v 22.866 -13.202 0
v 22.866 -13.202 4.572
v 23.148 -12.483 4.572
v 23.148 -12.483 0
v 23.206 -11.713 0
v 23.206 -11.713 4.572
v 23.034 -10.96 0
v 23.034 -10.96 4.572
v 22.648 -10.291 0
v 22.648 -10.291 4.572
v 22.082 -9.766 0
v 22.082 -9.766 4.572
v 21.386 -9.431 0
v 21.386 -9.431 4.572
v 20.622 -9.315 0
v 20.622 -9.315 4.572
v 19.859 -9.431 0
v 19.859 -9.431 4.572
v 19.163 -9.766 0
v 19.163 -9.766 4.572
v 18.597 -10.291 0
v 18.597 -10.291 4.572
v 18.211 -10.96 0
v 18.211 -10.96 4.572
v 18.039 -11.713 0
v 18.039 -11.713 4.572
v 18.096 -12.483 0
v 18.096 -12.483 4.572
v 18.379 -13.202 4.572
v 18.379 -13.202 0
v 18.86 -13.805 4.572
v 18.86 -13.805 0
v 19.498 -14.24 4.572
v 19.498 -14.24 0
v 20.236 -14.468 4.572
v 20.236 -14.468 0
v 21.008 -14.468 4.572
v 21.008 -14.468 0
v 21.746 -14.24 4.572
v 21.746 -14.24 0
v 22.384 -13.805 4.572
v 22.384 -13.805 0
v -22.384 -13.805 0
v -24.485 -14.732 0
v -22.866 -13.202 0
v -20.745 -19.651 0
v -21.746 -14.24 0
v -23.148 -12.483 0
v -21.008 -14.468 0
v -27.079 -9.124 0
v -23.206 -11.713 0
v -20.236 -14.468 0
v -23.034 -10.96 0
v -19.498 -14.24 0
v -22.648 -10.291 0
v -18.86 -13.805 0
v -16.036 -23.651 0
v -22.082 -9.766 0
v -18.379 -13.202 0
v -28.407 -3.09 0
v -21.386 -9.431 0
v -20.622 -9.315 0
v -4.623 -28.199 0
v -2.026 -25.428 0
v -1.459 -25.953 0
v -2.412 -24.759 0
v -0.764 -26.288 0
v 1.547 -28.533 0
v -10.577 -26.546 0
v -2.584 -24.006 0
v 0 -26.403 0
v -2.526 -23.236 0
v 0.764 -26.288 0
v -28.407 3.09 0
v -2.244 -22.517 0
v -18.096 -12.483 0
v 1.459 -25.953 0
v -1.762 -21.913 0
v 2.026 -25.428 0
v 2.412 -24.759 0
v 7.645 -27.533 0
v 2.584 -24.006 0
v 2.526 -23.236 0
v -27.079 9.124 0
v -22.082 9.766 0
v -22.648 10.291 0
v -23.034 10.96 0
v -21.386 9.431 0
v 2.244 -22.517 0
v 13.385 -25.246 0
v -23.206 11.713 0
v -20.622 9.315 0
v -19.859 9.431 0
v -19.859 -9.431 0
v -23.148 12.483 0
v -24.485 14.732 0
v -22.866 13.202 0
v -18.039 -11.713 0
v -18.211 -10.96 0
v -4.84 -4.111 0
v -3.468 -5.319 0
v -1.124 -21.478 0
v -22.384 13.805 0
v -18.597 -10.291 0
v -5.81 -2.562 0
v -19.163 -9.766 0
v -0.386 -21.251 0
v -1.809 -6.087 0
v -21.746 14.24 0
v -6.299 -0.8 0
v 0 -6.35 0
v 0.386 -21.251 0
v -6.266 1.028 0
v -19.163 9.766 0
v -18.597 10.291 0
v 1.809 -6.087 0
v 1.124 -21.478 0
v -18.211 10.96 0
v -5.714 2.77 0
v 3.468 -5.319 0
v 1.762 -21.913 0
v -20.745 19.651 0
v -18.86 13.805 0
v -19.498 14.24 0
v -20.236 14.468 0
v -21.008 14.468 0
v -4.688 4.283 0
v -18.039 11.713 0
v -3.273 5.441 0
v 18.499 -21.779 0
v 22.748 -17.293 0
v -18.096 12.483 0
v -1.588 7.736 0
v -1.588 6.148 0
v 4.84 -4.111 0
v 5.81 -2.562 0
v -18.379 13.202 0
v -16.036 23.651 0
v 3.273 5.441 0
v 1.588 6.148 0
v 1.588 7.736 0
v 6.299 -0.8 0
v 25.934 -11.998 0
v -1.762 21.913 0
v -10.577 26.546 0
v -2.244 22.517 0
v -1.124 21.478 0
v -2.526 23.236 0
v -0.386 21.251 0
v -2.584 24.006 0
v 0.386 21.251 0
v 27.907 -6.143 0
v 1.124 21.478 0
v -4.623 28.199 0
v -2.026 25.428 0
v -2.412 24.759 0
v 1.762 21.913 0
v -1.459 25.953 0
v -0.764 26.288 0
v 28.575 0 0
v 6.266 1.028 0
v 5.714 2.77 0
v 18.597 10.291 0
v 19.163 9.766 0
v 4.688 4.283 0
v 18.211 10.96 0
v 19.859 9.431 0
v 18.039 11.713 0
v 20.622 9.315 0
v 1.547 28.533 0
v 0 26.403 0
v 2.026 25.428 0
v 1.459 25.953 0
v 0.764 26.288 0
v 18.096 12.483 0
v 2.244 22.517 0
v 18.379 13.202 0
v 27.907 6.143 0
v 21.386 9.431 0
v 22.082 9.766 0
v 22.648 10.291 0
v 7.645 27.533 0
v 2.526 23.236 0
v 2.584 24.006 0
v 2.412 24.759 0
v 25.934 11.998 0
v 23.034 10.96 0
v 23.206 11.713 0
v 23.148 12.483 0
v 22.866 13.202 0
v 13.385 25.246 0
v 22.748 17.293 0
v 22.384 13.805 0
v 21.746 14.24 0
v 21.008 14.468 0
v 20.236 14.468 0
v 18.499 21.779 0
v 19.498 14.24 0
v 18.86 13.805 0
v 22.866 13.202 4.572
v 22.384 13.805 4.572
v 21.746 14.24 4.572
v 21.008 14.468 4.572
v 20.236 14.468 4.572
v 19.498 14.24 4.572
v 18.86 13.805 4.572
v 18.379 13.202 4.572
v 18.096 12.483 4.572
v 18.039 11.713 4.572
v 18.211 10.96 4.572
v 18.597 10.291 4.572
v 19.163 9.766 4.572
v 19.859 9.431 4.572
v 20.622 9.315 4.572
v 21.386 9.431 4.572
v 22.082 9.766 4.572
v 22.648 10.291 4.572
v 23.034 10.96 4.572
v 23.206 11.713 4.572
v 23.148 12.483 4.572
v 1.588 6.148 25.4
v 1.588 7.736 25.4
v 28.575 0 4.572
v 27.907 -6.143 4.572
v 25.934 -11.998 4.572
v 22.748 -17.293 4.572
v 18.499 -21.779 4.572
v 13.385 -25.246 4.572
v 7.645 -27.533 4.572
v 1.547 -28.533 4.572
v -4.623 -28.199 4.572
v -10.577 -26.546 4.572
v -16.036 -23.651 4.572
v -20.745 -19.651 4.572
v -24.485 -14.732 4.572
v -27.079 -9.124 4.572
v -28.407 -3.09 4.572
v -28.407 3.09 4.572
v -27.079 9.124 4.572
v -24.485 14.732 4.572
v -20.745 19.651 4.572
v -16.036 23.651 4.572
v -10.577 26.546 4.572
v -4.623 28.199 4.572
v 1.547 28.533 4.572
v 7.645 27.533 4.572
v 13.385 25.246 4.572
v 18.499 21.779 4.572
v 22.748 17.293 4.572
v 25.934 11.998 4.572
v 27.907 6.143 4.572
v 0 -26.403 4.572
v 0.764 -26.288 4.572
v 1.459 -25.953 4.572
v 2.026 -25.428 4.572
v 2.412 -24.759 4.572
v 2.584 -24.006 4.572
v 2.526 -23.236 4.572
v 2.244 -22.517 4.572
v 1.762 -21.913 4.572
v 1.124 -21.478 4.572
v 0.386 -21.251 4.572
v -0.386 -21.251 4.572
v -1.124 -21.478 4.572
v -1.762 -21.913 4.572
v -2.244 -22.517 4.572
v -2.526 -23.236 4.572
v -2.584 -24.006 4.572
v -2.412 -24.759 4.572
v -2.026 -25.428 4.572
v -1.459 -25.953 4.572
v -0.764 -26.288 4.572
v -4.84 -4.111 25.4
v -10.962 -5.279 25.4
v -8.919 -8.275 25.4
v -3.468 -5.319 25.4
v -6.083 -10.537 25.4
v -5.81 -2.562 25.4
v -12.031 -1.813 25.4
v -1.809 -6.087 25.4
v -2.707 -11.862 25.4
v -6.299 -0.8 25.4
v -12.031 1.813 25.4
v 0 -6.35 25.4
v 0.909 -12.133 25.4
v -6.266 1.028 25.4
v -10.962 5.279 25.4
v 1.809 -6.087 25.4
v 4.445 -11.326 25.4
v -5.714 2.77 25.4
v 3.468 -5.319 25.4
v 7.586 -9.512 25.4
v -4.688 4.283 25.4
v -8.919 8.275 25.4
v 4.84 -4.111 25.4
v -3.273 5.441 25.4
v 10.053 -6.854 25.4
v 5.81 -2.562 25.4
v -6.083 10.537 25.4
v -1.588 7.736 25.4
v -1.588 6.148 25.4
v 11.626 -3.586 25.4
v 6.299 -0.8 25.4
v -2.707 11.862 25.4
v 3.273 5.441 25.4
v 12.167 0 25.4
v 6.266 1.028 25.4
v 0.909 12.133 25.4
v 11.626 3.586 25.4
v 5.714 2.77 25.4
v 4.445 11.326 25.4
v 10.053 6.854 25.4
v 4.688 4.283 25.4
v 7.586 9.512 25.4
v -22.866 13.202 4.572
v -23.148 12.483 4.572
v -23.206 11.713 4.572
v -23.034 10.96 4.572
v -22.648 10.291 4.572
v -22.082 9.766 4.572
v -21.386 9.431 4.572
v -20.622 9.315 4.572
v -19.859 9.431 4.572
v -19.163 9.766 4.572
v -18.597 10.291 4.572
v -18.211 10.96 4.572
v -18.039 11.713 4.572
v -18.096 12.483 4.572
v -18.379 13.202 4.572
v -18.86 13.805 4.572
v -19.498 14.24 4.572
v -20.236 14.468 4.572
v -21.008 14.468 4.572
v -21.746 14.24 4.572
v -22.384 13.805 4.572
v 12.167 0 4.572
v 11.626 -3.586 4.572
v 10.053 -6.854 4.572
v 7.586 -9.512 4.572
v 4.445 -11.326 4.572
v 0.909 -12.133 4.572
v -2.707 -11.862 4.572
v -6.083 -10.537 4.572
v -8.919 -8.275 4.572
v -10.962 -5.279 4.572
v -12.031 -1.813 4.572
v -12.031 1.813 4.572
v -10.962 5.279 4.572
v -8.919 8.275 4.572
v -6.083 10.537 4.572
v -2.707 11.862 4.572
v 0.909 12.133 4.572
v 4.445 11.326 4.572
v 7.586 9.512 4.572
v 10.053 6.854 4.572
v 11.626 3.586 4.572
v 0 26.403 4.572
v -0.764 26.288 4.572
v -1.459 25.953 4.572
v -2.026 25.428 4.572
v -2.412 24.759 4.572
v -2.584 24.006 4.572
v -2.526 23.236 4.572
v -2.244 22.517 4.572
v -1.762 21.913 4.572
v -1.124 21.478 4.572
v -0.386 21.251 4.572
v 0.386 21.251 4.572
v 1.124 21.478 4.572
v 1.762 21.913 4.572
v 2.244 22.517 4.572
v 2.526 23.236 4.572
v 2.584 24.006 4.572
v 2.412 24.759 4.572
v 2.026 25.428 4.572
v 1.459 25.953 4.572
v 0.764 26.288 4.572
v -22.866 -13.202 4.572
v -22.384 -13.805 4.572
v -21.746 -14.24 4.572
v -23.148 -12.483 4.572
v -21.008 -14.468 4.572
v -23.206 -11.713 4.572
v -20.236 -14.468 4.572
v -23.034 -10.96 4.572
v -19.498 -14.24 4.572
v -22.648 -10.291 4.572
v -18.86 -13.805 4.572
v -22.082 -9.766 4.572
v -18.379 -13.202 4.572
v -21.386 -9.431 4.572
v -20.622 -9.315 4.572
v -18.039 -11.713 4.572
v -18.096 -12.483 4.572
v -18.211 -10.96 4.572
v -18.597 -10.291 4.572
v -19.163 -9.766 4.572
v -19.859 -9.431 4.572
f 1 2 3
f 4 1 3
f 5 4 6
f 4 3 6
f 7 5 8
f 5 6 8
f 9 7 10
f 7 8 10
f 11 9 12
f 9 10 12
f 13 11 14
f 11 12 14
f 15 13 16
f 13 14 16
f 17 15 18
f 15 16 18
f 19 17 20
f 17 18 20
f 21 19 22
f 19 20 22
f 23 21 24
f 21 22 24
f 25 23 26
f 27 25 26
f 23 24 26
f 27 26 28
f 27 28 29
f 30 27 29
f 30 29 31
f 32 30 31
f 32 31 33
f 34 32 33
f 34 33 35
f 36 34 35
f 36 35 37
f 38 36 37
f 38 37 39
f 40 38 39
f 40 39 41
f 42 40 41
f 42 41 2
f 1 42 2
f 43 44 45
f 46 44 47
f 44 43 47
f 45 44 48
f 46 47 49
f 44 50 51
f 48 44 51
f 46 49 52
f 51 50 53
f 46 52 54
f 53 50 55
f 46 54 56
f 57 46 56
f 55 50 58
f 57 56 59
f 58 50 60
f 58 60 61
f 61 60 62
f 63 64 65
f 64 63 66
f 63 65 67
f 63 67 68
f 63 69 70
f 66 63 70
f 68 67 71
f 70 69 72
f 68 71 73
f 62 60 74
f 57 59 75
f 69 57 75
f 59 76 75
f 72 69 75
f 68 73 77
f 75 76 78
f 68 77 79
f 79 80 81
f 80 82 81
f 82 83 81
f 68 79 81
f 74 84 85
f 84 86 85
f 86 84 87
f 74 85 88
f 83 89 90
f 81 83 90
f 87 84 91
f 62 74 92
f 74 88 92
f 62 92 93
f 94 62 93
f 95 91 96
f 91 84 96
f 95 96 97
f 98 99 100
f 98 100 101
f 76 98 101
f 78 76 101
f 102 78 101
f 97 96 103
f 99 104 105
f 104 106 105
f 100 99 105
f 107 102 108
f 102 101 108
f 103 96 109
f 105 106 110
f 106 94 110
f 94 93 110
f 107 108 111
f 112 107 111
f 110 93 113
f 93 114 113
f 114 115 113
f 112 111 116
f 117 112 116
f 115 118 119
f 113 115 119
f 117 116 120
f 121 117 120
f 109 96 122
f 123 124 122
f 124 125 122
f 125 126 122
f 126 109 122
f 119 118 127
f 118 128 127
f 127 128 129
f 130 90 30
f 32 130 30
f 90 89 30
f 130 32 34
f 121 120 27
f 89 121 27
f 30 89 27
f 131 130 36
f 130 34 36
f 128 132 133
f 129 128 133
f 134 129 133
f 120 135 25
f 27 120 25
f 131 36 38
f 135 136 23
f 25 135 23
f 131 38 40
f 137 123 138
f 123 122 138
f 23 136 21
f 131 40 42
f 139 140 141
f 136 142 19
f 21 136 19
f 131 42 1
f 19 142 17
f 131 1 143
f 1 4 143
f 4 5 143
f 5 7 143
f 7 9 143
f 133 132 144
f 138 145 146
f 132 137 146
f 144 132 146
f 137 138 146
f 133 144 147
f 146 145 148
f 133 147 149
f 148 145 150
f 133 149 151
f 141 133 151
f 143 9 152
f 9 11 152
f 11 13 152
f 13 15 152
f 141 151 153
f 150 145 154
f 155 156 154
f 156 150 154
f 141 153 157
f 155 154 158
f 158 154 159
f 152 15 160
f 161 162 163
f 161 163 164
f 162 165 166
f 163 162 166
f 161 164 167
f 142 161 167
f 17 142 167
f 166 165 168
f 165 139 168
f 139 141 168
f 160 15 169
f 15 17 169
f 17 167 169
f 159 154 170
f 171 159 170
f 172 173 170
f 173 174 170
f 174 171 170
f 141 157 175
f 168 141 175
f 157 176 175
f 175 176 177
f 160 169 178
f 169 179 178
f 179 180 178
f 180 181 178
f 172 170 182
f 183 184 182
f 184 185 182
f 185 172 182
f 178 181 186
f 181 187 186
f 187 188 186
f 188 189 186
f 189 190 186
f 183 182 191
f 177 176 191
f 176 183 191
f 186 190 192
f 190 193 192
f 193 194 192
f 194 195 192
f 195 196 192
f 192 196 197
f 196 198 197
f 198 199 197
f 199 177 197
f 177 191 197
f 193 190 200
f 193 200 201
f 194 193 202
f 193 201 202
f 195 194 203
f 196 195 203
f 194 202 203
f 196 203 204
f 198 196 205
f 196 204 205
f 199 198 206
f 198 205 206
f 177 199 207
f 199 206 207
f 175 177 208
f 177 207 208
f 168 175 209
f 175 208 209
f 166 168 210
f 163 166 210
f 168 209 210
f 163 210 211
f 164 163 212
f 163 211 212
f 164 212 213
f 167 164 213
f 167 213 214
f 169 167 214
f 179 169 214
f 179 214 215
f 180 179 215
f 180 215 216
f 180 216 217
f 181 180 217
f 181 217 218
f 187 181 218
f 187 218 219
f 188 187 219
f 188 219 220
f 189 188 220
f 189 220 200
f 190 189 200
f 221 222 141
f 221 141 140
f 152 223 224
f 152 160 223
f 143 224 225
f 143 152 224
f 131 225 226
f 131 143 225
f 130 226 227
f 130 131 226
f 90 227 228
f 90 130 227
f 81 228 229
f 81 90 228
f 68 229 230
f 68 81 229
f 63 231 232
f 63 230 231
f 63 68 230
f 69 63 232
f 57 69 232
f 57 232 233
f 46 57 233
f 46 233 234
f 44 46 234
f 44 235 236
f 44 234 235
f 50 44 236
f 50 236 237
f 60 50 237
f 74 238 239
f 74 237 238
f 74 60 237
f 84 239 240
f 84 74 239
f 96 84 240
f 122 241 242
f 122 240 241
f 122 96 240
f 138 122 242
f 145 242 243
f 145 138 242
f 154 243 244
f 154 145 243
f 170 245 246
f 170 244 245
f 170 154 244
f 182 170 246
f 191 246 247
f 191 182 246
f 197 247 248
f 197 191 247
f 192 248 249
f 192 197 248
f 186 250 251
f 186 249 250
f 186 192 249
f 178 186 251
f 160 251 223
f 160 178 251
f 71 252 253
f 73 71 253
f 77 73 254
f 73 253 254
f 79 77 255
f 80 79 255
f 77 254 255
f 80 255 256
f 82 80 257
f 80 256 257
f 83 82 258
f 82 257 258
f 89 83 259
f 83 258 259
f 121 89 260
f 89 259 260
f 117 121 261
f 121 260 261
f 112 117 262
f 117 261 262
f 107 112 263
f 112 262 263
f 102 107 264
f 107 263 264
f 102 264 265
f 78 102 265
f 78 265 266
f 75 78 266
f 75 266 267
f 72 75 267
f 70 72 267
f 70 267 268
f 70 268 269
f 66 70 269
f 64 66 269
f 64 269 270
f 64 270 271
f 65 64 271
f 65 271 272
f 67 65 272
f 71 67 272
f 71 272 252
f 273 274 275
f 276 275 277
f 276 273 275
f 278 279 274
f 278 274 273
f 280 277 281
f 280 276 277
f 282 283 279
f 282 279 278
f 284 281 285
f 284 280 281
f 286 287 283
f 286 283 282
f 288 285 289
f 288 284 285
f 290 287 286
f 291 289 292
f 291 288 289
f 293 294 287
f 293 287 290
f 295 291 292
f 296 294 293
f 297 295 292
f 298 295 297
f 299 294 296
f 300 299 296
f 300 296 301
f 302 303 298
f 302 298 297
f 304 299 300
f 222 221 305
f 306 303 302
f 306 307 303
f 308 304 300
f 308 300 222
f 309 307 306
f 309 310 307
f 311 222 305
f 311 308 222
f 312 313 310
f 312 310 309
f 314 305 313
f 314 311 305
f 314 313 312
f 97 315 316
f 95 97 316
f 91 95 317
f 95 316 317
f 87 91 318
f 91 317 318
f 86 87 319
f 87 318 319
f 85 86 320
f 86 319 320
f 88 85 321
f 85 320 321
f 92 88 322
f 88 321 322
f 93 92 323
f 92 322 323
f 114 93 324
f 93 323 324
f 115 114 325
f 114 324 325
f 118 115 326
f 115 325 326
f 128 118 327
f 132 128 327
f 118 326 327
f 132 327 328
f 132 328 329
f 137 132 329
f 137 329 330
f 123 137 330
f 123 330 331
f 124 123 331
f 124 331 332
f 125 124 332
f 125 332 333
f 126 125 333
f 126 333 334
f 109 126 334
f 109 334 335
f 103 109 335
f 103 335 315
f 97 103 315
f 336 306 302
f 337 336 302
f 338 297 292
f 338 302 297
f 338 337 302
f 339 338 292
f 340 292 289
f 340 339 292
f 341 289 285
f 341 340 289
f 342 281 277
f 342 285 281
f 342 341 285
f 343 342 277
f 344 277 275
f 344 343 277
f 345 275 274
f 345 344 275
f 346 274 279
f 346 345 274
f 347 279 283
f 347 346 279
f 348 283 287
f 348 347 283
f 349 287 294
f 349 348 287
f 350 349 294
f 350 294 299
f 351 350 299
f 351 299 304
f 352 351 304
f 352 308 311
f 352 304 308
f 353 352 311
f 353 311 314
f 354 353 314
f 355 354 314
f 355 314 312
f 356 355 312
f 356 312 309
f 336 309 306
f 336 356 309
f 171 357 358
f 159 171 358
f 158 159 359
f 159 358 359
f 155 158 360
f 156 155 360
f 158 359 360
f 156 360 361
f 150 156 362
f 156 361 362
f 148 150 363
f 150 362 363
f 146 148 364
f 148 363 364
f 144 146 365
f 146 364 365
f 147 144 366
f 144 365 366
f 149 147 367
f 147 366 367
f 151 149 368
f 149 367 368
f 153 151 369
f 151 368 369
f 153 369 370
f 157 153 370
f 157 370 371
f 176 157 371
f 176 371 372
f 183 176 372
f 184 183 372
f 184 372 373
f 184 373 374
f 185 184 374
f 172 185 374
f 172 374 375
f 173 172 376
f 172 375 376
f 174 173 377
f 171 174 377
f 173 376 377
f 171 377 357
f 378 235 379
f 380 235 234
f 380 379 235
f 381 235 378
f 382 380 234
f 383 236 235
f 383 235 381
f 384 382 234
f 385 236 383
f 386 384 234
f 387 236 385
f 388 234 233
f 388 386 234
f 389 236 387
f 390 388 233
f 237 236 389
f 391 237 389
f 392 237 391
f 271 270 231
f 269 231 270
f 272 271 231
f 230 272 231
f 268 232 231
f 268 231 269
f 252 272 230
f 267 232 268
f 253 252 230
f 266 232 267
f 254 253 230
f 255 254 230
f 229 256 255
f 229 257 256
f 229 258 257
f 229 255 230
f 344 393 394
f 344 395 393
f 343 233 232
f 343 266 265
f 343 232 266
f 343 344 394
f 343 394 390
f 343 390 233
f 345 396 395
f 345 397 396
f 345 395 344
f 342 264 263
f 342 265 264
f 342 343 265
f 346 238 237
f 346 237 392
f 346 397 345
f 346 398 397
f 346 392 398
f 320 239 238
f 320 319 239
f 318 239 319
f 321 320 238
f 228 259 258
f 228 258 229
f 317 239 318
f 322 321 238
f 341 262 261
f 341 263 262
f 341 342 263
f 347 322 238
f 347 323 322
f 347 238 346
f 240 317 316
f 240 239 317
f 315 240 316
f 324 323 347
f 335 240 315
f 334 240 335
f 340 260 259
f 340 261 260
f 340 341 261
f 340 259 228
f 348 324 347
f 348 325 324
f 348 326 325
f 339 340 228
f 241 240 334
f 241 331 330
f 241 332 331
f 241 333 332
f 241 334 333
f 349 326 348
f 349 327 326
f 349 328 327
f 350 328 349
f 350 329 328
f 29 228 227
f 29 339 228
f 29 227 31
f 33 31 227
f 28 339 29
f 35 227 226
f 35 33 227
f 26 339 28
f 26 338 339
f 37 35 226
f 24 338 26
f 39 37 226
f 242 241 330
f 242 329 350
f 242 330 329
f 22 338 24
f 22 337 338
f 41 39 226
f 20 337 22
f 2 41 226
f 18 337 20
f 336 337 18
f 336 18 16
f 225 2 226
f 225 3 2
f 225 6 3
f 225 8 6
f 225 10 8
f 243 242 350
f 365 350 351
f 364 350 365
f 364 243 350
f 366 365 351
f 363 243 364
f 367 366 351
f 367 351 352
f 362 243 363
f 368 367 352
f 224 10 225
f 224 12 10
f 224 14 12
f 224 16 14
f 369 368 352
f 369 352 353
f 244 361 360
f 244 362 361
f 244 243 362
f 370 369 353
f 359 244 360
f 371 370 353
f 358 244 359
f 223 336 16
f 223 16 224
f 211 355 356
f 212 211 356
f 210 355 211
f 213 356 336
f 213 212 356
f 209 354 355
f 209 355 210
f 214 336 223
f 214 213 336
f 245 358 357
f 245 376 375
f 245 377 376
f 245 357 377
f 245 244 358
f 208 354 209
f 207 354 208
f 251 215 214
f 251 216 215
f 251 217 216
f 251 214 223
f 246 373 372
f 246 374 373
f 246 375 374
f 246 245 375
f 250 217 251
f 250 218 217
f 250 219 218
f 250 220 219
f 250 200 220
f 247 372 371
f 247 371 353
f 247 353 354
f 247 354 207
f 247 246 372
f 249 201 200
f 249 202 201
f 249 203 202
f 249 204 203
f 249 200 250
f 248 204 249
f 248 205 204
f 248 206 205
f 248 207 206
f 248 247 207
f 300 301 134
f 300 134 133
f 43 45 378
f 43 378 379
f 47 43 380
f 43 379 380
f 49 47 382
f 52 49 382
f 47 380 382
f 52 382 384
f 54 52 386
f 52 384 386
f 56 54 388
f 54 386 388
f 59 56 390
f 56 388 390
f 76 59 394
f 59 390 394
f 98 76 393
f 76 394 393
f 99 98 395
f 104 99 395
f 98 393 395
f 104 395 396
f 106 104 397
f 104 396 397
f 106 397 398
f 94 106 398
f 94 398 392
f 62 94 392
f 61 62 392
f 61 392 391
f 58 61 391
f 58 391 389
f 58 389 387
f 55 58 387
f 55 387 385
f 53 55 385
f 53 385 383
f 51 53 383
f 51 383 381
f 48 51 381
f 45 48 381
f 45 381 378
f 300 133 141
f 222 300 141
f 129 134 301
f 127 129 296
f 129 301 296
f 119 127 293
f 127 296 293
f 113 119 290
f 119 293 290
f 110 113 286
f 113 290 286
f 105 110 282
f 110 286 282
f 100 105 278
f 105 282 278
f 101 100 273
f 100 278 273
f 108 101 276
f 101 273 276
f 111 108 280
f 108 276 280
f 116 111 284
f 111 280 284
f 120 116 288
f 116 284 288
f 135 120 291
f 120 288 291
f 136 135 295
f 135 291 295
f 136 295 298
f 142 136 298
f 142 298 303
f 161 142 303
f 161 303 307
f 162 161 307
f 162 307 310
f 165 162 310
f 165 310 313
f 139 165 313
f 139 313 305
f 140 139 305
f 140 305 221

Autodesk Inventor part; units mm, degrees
ref_plane "YZ Plane" through (0, 0, 0) normal (1, 0, 0) x (0, 1, 0)
ref_plane "XZ Plane" through (0, 0, 0) normal (0, 1, 0) x (-1, 0, 0)
ref_plane "XY Plane" through (0, 0, 0) normal (0, 0, 1) x (1, 0, 0)
sketch "Sketch1" plane through (0, 0, 0) normal (0, 0, 1) x (1, 0, 0)
  circle A0 centre (0, 0) radius 28.575
  dimension "d0" = 57.15
extrude "Extrusion1" add sketch "Sketch1" along normal blind 4.572
sketch "Sketch2" plane through (0, 0, 4.572) normal (0, 0, 1) x (1, 0, 0)
  circle A0 centre (0, 0) radius 28.575 projected
  circle A1 centre (0, 0) radius 12.1666
  dimension "d3" = 24.3332
extrude "Extrusion2" add sketch "Sketch2" along normal blind 20.828 contours A1
sketch "Sketch3" plane through (0, 0, 25.4) normal (0, 0, 1) x (1, 0, 0)
  circle A0 centre (0, 0) radius 12.1666 projected
  circle A1 centre (0, 0) radius 6.35
  line L0 (-1.5875, 7.7359) -> (1.5875, 7.7359)
  line L1 (1.5875, 7.7359) -> (1.5875, 4.5609)
  line L2 (1.5875, 4.5609) -> (-1.5875, 4.5609)
  line L3 (-1.5875, 4.5609) -> (-1.5875, 7.7359)
  point P0 (0, 7.7359)
  point P1 (-1.5875, 6.1484)
  dimension "d6" = 12.7
  dimension "d7" = 3.175
  dimension "d8" = 3.175
extrude "Extrusion3" cut sketch "Sketch3" against normal through all contours A1 L3 L2 L1 | L1 L2 L3 A1 | A1 L3 L0 L1
sketch "Sketch4" plane through (0, 0, 0) normal (0, 0, -1) x (-1, 0, 0)
  arc A0 (-1.5875, 6.1484) -> (1.5875, 6.1484) centre (0, 0) ccw construction
  circle A1 centre (0, 0) radius 28.575 construction
  circle A2 centre (0, 0) radius 23.8125 construction
  point P0 (0, 23.8125)
  dimension "d11" = 47.625
hole "Hole1" at (0, 23.8125, 0) direction (0, 0, 1) diameter 5.1816 end through all
pattern_circular "Circular Pattern1" count 6 over 360 about axis through (0, 0, 0) along (0, 0, 1) of "Hole1"
properties part number "Hub 500 key" material "Aluminum 6061"
